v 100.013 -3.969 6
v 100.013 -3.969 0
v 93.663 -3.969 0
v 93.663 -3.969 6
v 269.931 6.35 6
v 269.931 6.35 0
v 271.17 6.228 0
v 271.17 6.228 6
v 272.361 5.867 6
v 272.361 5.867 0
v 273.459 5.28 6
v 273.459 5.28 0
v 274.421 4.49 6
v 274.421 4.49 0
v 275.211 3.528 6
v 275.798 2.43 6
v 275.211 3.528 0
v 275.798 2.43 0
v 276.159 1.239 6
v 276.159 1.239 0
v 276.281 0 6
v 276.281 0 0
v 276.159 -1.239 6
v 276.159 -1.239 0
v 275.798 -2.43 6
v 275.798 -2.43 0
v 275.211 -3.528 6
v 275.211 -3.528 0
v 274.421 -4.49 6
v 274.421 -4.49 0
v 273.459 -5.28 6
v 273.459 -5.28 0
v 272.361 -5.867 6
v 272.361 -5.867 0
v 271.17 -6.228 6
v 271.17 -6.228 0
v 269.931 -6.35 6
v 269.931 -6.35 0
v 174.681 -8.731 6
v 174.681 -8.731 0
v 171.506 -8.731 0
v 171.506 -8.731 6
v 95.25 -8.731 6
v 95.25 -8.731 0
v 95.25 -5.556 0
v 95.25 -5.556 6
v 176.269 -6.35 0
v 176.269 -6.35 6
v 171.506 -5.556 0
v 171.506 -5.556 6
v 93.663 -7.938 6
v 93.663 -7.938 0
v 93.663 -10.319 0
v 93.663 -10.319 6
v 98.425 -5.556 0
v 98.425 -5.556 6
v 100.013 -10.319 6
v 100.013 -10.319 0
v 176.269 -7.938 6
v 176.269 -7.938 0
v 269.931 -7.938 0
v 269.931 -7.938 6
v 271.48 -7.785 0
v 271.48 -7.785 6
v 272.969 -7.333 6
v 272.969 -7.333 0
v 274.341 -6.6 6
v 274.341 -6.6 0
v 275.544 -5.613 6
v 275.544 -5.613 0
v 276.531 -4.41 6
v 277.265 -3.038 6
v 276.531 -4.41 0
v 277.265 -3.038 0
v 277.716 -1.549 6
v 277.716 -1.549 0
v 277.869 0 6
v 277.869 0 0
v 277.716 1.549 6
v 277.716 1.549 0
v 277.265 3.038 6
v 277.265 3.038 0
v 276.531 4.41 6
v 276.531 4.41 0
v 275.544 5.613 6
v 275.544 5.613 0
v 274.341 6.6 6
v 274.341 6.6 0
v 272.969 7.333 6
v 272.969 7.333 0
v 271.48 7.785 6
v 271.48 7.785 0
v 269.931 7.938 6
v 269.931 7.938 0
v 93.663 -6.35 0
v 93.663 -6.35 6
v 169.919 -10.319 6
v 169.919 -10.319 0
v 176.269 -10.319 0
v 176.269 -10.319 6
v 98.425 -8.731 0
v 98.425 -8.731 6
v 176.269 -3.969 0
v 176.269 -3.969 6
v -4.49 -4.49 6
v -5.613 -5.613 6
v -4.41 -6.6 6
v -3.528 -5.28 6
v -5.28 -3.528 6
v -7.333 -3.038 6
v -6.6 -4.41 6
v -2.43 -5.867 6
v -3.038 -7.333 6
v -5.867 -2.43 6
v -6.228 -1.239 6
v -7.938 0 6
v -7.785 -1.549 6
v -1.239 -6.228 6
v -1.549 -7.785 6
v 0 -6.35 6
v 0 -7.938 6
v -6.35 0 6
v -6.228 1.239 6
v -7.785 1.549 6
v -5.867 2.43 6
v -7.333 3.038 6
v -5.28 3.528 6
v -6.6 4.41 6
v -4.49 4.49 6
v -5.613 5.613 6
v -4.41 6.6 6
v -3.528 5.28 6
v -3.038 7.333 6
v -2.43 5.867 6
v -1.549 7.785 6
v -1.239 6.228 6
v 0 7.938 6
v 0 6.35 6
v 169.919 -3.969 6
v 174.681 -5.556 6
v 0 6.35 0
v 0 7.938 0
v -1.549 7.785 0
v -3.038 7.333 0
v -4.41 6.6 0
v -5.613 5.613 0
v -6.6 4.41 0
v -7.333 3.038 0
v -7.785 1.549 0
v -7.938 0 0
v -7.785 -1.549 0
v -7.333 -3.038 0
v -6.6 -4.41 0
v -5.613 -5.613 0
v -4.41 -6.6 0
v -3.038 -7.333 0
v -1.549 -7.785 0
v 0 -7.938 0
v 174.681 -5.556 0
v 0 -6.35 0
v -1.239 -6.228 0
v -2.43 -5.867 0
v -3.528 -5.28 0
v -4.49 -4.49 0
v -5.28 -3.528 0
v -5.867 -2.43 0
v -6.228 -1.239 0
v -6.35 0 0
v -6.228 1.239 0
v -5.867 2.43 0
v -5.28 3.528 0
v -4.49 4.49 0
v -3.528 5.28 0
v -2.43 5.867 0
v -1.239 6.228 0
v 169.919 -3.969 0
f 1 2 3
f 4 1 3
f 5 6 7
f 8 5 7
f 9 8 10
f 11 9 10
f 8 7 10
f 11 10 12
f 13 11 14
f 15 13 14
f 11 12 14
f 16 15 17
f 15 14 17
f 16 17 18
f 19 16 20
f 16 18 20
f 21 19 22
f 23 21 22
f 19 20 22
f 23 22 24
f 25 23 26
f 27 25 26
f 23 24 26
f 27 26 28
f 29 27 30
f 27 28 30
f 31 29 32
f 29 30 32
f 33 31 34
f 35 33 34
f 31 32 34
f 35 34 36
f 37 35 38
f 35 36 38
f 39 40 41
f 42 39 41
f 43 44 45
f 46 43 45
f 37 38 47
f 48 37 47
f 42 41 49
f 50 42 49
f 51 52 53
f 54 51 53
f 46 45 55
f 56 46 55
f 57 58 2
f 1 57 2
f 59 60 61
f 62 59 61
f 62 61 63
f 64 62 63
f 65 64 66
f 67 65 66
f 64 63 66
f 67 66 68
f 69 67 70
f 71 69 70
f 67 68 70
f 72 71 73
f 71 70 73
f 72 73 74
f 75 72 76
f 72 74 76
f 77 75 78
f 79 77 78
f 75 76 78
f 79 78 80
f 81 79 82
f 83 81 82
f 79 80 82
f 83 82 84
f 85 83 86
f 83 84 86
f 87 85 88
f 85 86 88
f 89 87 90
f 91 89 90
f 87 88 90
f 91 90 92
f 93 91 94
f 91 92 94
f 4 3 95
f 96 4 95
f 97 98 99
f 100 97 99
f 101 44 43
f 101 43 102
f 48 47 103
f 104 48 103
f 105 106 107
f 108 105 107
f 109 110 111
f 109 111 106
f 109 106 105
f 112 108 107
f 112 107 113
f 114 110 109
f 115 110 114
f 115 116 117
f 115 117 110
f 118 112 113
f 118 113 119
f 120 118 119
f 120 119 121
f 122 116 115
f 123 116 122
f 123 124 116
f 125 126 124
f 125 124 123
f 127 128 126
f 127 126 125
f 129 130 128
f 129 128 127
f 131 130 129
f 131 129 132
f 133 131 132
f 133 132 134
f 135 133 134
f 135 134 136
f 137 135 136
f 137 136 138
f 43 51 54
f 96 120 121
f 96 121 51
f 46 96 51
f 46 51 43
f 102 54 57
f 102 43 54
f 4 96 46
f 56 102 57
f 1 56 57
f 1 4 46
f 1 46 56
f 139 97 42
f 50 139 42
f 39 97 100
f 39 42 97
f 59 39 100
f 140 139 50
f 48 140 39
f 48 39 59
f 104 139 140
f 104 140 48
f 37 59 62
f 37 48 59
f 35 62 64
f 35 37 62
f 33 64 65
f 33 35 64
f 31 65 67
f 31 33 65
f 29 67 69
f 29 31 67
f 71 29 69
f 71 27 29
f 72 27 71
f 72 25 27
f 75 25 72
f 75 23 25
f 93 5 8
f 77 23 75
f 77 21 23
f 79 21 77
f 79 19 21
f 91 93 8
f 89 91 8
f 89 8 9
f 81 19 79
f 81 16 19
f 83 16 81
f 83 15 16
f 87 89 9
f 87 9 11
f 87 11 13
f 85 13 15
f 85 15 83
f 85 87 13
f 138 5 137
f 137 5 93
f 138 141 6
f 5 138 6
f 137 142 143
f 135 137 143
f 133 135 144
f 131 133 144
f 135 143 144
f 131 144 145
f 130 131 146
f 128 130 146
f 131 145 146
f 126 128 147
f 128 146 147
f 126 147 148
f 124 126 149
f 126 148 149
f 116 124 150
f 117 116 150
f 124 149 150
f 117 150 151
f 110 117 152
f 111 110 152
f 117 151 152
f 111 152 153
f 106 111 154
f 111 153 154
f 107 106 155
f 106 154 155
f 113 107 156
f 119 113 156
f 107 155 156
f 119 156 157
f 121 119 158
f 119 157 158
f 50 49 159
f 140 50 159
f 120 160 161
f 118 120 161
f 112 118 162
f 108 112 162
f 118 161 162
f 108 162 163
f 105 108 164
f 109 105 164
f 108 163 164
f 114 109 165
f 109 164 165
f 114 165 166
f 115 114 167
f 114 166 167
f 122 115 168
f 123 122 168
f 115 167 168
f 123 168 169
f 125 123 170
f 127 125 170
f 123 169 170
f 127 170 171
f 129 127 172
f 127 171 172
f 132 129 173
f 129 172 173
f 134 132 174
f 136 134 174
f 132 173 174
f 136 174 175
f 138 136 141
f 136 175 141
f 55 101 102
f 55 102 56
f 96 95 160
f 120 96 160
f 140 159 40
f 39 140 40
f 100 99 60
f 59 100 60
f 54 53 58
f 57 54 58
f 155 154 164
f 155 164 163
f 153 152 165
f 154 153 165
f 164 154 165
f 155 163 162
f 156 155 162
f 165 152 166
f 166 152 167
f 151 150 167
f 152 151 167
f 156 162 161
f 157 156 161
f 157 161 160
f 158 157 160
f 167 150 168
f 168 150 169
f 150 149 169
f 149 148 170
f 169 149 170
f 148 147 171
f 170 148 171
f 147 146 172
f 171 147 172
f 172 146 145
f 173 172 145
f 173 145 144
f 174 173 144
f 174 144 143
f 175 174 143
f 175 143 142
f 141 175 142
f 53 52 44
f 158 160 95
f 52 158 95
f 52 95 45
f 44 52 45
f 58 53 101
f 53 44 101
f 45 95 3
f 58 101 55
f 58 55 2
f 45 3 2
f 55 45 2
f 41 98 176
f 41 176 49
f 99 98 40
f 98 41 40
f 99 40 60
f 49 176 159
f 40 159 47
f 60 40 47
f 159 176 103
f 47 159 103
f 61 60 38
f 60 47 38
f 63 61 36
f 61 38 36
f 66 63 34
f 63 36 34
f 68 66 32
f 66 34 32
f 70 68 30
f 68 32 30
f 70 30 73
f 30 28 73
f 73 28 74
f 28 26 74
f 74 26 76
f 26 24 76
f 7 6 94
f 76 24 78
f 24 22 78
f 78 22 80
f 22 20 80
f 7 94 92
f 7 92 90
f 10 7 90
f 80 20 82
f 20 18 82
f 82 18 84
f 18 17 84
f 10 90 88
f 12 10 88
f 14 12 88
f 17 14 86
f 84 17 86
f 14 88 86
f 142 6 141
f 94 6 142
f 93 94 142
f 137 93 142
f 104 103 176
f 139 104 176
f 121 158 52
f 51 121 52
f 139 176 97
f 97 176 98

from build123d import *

# Parameters (mm, degrees)
F0_W     = 3.175
F0_H     = 3.175
F1_DEPTH = 6


with BuildPart() as f1:
    # F0 (on Top) → F1 (new body)
    with BuildSketch(Plane.XY):
        with BuildLine():
            ThreePointArc((269.931261, -7.9375), (277.868761, 0), (269.931261, 7.9375))
            Line((269.931261, 7.9375), (0, 7.9375))
            ThreePointArc((0, 7.9375), (-7.9375, 0), (0, -7.9375))
            Line((0, -7.9375), (93.662513, -7.9375))
            Line((93.662513, -7.9375), (93.662513, -10.31875))
            Line((93.662513, -10.31875), (100.012513, -10.31875))
            Line((100.012513, -10.31875), (100.012513, -3.96875))
            Line((100.012513, -3.96875), (93.662513, -3.96875))
            Line((93.662513, -3.96875), (93.662513, -6.35))
            Line((93.662513, -6.35), (0, -6.35))
            ThreePointArc((0, -6.35), (-6.35, 0), (0, 6.35))
            Line((0, 6.35), (269.931261, 6.35))
            ThreePointArc((269.931261, 6.35), (276.281261, 0), (269.931261, -6.35))
            Line((269.931261, -6.35), (176.268748, -6.35))
            Line((176.268748, -6.35), (176.268748, -3.96875))
            Line((176.268748, -3.96875), (173.093748, -3.96875))
            Line((173.093748, -3.96875), (169.918748, -3.96875))
            Line((169.918748, -3.96875), (169.918748, -10.31875))
            Line((169.918748, -10.31875), (176.268748, -10.31875))
            Line((176.268748, -10.31875), (176.268748, -7.9375))
            Line((176.268748, -7.9375), (269.931261, -7.9375))
        make_face()
        with Locations((96.837513, -7.14375)):
            Rectangle(F0_W, F0_H, mode=Mode.SUBTRACT)
        Polygon((171.506248, -5.55625), (173.093748, -5.55625), (174.681248, -5.55625), (174.681248, -8.73125), (171.506248, -8.73125), align=None, mode=Mode.SUBTRACT)
    extrude(amount=F1_DEPTH)


solid = f1.part
